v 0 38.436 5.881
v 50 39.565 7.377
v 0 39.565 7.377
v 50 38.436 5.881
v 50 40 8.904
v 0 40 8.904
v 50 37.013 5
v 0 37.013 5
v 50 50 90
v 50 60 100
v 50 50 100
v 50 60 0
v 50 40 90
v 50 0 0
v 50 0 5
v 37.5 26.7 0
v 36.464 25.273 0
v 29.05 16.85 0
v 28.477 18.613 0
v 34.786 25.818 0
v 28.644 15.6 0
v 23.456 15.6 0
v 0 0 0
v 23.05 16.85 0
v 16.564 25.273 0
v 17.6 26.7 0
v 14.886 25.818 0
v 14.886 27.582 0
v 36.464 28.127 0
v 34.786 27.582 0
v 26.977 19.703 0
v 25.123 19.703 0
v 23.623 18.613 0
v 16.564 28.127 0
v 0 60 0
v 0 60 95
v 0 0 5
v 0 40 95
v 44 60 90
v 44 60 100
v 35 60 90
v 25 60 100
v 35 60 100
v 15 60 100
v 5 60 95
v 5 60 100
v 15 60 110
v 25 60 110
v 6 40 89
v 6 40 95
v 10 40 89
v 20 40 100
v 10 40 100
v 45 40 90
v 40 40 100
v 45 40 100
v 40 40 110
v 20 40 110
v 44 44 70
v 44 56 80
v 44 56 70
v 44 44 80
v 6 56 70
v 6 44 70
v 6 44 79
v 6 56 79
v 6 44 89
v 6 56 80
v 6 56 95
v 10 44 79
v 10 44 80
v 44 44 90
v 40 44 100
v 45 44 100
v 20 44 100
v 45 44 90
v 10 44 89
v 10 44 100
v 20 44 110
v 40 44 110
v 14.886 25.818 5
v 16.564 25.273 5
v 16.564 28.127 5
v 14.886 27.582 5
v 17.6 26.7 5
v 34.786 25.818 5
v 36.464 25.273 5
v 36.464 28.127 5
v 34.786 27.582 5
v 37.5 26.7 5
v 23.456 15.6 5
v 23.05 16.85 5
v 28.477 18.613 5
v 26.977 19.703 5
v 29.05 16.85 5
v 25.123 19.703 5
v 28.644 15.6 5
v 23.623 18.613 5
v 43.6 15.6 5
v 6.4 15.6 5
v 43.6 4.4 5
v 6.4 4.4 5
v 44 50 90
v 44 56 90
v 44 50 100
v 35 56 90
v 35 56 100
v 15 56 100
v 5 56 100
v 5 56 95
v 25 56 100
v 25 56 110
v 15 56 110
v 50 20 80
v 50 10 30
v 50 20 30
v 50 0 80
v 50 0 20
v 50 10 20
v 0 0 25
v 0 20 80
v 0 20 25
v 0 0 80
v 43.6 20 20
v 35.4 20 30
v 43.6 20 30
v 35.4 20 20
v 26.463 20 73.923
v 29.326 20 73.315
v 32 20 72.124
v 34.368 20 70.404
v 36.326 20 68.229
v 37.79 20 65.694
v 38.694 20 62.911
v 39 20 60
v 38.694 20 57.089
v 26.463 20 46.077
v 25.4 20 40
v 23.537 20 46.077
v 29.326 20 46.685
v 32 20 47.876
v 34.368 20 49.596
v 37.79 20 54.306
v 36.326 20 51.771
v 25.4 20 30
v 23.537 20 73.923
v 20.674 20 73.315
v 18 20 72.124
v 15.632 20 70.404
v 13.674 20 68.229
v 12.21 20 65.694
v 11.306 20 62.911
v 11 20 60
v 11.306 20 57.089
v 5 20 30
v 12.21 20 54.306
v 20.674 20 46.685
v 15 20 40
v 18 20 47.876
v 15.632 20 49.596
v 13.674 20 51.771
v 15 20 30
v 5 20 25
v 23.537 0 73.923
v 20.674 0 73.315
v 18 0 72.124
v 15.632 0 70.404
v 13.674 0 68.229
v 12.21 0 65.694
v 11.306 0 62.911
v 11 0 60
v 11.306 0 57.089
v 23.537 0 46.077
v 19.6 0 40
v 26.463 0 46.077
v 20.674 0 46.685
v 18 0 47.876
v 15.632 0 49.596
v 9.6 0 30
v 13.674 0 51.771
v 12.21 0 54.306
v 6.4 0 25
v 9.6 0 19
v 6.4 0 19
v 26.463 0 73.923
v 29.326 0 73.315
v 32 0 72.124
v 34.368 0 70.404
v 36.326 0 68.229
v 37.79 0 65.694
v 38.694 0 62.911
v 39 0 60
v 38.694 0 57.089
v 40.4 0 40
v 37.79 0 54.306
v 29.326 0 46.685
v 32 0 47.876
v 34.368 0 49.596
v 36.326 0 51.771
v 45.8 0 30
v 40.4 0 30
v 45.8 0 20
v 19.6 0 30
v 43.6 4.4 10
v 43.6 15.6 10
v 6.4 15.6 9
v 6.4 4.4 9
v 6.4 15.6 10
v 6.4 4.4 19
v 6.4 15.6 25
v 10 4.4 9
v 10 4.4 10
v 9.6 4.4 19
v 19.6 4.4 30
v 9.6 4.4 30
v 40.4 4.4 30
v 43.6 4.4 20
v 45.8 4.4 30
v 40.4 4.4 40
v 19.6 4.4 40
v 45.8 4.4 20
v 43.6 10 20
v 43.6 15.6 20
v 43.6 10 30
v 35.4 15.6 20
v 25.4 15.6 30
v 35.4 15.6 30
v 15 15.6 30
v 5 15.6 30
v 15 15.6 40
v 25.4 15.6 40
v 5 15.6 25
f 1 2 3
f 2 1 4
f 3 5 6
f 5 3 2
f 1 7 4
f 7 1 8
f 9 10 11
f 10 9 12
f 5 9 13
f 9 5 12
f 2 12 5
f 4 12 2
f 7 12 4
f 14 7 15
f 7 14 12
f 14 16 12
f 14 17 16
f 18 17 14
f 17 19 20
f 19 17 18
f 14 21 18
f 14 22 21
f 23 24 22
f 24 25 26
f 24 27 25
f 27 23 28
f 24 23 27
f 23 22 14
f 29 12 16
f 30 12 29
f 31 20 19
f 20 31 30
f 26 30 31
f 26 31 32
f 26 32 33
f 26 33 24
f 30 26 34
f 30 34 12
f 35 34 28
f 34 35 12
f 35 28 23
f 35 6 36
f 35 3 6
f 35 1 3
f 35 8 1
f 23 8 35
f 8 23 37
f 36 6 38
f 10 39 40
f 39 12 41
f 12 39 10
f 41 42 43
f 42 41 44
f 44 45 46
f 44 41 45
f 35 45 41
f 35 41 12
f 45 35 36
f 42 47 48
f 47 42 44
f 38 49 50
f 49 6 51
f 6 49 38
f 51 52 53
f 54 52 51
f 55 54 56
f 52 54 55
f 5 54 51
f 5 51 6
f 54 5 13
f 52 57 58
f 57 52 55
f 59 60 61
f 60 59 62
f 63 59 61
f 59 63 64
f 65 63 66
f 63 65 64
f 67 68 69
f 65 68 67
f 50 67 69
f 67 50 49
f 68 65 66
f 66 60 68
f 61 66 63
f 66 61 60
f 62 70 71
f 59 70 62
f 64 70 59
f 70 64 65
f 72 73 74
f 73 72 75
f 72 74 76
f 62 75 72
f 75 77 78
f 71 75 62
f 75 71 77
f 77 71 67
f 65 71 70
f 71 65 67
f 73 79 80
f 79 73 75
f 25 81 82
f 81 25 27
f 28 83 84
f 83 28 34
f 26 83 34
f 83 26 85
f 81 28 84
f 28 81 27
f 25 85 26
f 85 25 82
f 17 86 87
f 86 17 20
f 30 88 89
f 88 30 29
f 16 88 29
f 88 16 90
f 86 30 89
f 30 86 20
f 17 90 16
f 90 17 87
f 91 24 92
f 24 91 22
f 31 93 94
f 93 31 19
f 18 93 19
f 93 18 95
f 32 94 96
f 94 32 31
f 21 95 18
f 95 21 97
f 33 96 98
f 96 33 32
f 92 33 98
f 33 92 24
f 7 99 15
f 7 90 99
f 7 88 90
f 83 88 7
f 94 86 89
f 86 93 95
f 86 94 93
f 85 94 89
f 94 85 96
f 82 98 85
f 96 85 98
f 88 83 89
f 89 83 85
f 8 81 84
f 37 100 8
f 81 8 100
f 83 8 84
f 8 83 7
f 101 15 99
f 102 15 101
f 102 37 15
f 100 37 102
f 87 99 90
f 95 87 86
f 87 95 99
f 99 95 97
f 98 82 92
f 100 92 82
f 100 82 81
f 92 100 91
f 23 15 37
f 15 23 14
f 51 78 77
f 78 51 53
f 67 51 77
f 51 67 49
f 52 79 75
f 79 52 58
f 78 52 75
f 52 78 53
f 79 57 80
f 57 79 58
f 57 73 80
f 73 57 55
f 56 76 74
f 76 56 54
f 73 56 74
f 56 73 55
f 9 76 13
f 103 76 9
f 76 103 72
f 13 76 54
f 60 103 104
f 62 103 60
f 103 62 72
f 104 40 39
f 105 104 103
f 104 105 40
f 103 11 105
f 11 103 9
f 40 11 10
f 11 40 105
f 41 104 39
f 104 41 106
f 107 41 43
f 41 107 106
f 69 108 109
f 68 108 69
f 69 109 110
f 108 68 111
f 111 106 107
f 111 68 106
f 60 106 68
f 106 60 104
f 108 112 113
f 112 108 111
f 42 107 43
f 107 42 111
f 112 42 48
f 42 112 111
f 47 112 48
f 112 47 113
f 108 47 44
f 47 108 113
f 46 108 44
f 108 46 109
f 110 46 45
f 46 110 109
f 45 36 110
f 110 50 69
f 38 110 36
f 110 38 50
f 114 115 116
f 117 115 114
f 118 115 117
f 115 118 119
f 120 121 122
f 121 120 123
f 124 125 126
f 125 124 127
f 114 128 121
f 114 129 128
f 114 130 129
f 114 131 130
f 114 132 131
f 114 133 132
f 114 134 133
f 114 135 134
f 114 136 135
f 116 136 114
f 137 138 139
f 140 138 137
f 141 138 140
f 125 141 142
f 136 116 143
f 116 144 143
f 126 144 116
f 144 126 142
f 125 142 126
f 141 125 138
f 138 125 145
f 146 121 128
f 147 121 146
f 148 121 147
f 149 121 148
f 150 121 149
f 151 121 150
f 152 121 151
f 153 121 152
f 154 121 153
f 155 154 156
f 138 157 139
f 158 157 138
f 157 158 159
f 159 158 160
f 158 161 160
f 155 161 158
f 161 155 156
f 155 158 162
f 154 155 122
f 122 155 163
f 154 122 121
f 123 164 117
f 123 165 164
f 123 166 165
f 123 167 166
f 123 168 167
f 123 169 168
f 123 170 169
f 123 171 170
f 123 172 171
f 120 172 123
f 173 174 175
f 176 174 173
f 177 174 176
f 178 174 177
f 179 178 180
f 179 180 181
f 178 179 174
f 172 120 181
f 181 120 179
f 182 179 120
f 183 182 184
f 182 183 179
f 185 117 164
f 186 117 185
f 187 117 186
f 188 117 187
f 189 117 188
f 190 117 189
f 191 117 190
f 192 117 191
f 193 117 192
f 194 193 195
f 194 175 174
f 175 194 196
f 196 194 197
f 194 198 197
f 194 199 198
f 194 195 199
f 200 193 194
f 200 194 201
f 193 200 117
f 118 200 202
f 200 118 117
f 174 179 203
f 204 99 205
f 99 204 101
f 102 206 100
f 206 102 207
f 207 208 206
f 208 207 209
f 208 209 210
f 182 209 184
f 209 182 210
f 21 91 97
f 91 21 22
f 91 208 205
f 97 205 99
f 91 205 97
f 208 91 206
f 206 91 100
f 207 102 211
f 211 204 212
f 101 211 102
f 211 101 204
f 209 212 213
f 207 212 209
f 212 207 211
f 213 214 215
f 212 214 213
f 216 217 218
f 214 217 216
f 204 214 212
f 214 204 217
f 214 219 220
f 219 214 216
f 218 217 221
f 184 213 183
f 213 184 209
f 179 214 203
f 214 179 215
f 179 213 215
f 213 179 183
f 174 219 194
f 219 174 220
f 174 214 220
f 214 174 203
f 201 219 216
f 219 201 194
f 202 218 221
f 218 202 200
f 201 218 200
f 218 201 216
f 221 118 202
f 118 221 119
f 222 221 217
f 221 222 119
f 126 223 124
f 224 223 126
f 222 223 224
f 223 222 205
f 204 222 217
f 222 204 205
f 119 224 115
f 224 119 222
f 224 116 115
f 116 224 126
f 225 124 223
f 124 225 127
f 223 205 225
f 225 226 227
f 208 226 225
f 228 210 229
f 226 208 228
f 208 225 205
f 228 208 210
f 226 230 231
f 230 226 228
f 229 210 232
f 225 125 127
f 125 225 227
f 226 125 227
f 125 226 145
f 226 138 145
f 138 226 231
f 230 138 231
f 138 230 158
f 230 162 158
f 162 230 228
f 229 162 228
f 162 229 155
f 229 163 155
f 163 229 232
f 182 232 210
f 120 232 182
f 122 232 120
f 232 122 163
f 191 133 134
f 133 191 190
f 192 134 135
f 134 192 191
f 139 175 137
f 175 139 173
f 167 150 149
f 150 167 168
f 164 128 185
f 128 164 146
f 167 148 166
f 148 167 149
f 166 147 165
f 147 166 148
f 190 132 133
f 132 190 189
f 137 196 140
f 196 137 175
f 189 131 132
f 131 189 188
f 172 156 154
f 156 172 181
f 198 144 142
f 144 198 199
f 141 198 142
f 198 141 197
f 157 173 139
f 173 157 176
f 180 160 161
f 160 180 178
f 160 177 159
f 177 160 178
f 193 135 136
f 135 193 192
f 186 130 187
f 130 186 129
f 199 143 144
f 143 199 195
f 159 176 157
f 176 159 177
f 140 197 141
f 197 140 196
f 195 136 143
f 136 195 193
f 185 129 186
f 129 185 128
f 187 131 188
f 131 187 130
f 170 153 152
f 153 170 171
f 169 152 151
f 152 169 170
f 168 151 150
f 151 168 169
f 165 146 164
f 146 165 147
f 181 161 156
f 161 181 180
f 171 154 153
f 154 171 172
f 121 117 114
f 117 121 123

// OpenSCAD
// file: nutsnbolts/data-access.scad
// Norm Nuts and Bolts - a OpenSCAD library
// Copyright (C) 2012  Johannes Kneer

// This program is free software: you can redistribute it and/or modify
// it under the terms of the GNU General Public License as published by
// the Free Software Foundation, either version 3 of the License, or
// (at your option) any later version.

// This program is distributed in the hope that it will be useful,
// but WITHOUT ANY WARRANTY; without even the implied warranty of
// MERCHANTABILITY or FITNESS FOR A PARTICULAR PURPOSE.  See the
// GNU General Public License for more details.

// You should have received a copy of the GNU General Public License
// along with this program.  If not, see <http://www.gnu.org/licenses/>.


// DATABASE ACCESS FUNCTIONS AND CONSTANTS



// == CONSTANTS ==

// screw table access keys
_NB_S_DESC            = 0;
_NB_S_FAMKEY			    = 1;
_NB_S_LENGTH          = 2;
_NB_S_NOTHREAD_LENGTH = 3;

_NB_F_DESC			      = 0;
_NB_F_OUTER_DIA       = 1;
_NB_F_INNER_DIA       = 2;
_NB_F_LEAD            = 3;
_NB_F_KEY             = 4;
_NB_F_KEY_DEPTH       = 5;
_NB_F_HEAD_HEIGHT     = 6;
_NB_F_HEAD_DIA        = 7;
_NB_F_NUT_KEY         = 8;
_NB_F_NUT_HEIGHT      = 9;
_NB_F_PITCH_FINE      = 10;
_NB_F_PITCH_MEDIUM    = 11;
_NB_F_PITCH_COARSE    = 12;


// == FUNCTIONS ==

// _get_screw("descriptor")   with descriptor = M8x25
//   find the line for a general object in the data matrix

function _get_screw(n) = data_screw[search([n], data_screw)[0]];
function _get_screw_fam(n) = data_screw_fam[search([_get_screw(n)[_NB_S_FAMKEY]], data_screw_fam)[0]];

function _get_fam(n) = data_screw_fam[search([n], data_screw_fam)[0]];


// _get_XXXXX("descriptor") functions
// find a single property in the database

function _get_desc(n)        = _get_screw(n)[_NB_S_DESC];
function _get_famkey(n)         = _get_screw(n)[_NB_S_FAMKEY];
function _get_length(n)      = _get_screw(n)[_NB_S_LENGTH];
function _get_nt_length(n)   = _get_screw(n)[_NB_S_NOTHREAD_LENGTH];

function _get_outer_dia(n)   = _get_screw_fam(n)[_NB_F_OUTER_DIA];
function _get_inner_dia(n)   = _get_screw_fam(n)[_NB_F_INNER_DIA];
function _get_lead(n)        = _get_screw_fam(n)[_NB_F_LEAD];
function _get_head_height(n) = _get_screw_fam(n)[_NB_F_HEAD_HEIGHT];
function _get_head_dia(n)    = _get_screw_fam(n)[_NB_F_HEAD_DIA];
function _get_nut_key(n)     = _get_screw_fam(n)[_NB_F_NUT_KEY];
function _get_nut_height(n)  = _get_screw_fam(n)[_NB_F_NUT_HEIGHT];
function _get_fine_pitch(n)  = _get_screw_fam(n)[_NB_F_PITCH_FINE];
function _get_medium_pitch(n)  = _get_screw_fam(n)[_NB_F_PITCH_MEDIUM];
function _get_coarse_pitch(n)  = _get_screw_fam(n)[_NB_F_PITCH_COARSE];
// file: top_lock.scad
//top_lock();

module top_lock(){
difference(){
    
cube([50,20, 1]);
translate(v = [6,4,-1]){
cube([38,12, 5]);
}
}


cube([10, 4, 10]);
translate(v = [10,0,1]){
cube([10, 4, 20]);
}
translate(v = [20,0,1]){
cube([10, 4, 30]);
}
translate(v = [30,0,1]){
cube([10, 4, 30]);
 }
translate(v = [40,0,1]){
cube([5, 4, 20]);
 }
 
translate(v = [44, 0, 1]){
 cube([6, 10, 10]);
 }
 
translate(v = [44, 10, 1]){
 cube([6, 10, 20]);
 }
 
 
translate(v = [35,16,1]){
cube([10, 4, 10]);
}
translate(v = [25,16,1]){
cube([10, 4, 20]);
 }
translate(v = [15,16,1]){
cube([10, 4, 30]);
 }
translate(v = [5,16,1]){       
cube([10, 4, 20]);
}

cube([6,20,16]);
}
// file: top_hole.scad
include <nutsnbolts/cyl_head_bolt.scad>
include <top_lock.scad>

render_thread = "no";
spool_height = 80;






module top_hole(clearance = 0) {


//thing sticking up
translate(v = [0, 40, 0]) {


difference(){
cube([50, 20, spool_height]);

translate(v = [6 + clearance/2, 4 + clearance/2, 70]){
cube([38 - clearance, 12 - clearance, 40]);
}
}

}

//top lock
translate(v = [0, 40, spool_height - 1]) {   
difference(){
    
cube([50,20, 1]);
translate(v = [6,4,-1]){
cube([38,12, 5]);
}
}


cube([10, 4 + clearance/2, 10]);
translate(v = [10 - clearance/2,0,1]){
cube([10 + clearance, 4 + clearance/2, 20]);
}
translate(v = [20 - clearance/2,0,1]){
cube([10 + clearance, 4 + clearance/2, 30]);
}
translate(v = [30 - clearance/2,0,1]){
cube([10 + clearance, 4 + clearance/2, 30]);
 }
translate(v = [40,0,1]){
cube([5 + clearance, 4 + clearance/2, 20]);
}
 
translate(v = [44 - clearance/2, 0, 1]){
 cube([6 + clearance/2, 10, 10]);
 }
 
translate(v = [44 - clearance/2, 10, 1]){
 cube([6 + clearance/2, 10, 20]);
 }
 
 
translate(v = [35,16 - clearance/2,1]){
cube([10, 4 + clearance/2, 10]);
}
translate(v = [25,16 - clearance/2,1]){
cube([10 + clearance/2, 4 + clearance/2, 20]);
 }
translate(v = [15,16 - clearance/2,1]){
cube([10 + clearance/2, 4 + clearance/2, 30]);
 }
translate(v = [5,16 - clearance/2,1]){       
cube([10 + clearance/2, 4 + clearance/2, 20]);
}

cube([6 + clearance/2,20,16]);
}













//curve
translate(v = [0,33,0]){
difference(){

cube([50,10, 15]);
translate(v = [-5, 2, 9.65]){
union(){
rotate(a = [0,90,0]){
    cylinder(h = 60, r = 5.1);
  }
translate(v = [0,-3,0]){
cube([60,13, 15]); 
 }
  }
}
}
}


//base
difference(){
cube([50, 60, 5]);

translate(v = [0, 4, 0]){
union(){
translate(v = [11, 1, -1]){
}
translate(v = [16.1, 3, 10]) {
screw("M3x10", render_thread);
}

translate(v = [16.1, 22.7, 10] ){
screw("M3x10", render_thread);
}

translate(v = [36, 22.7, 10] ){
screw("M3x10", render_thread);
}

translate(v = [36, 3, 10] ){
screw("M3x10", render_thread);
}
translate(v = [26.05, 12.85, 10]){
    screw("M6x10", render_thread);
    }
}
}
}

}
// file: spool_bottom.scad
include <nutsnbolts/cyl_head_bolt.scad>
include <top_lock.scad>

render_thread = "no";
spool_height = 80;



spool_bottom();

module spool_bottom() {
//curve
translate(v = [0,33,0]){
difference(){

cube([50,10, 15]);
translate(v = [-5, 2, 9.65]){
union(){
rotate(a = [0,90,0]){
    cylinder(h = 60, r = 5.1);
  }
translate(v = [0,-3,0]){
cube([60,13, 15]); 
 }
  }
}
}
}

//thing sticking up
translate(v = [0, 40, 0]) {


difference(){
cube([50, 20, spool_height]);

translate(v = [6, 4, 70]){
cube([38, 12, 40]);
}
}

}









//base
difference(){
cube([50, 60, 5]);

translate(v = [0, 4, 0]){
union(){
translate(v = [11, 1, -1]){
}
translate(v = [16.1, 3, 10]) {
screw("M3x10", render_thread);
}

translate(v = [16.1, 22.7, 10] ){
screw("M3x10", render_thread);
}

translate(v = [36, 22.7, 10] ){
screw("M3x10", render_thread);
}

translate(v = [36, 3, 10] ){
screw("M3x10", render_thread);
}
translate(v = [26.05, 12.85, 10]){
    screw("M6x10", render_thread);
    }
}
}
}
//top lock
translate(v = [0, 40, spool_height - 1]) {   
 top_lock();
}
}
// main file
include <spool_bottom.scad>
include <top_hole.scad>
difference(){

cube([50,20,80]);


union(){    
translate(v = [0,-40,-70]){
top_hole(.8);
}


translate(v = [25,25,60]){
rotate(a = [90,0,0]){
cylinder (d = 28, h = 30);
}
}
}
}
